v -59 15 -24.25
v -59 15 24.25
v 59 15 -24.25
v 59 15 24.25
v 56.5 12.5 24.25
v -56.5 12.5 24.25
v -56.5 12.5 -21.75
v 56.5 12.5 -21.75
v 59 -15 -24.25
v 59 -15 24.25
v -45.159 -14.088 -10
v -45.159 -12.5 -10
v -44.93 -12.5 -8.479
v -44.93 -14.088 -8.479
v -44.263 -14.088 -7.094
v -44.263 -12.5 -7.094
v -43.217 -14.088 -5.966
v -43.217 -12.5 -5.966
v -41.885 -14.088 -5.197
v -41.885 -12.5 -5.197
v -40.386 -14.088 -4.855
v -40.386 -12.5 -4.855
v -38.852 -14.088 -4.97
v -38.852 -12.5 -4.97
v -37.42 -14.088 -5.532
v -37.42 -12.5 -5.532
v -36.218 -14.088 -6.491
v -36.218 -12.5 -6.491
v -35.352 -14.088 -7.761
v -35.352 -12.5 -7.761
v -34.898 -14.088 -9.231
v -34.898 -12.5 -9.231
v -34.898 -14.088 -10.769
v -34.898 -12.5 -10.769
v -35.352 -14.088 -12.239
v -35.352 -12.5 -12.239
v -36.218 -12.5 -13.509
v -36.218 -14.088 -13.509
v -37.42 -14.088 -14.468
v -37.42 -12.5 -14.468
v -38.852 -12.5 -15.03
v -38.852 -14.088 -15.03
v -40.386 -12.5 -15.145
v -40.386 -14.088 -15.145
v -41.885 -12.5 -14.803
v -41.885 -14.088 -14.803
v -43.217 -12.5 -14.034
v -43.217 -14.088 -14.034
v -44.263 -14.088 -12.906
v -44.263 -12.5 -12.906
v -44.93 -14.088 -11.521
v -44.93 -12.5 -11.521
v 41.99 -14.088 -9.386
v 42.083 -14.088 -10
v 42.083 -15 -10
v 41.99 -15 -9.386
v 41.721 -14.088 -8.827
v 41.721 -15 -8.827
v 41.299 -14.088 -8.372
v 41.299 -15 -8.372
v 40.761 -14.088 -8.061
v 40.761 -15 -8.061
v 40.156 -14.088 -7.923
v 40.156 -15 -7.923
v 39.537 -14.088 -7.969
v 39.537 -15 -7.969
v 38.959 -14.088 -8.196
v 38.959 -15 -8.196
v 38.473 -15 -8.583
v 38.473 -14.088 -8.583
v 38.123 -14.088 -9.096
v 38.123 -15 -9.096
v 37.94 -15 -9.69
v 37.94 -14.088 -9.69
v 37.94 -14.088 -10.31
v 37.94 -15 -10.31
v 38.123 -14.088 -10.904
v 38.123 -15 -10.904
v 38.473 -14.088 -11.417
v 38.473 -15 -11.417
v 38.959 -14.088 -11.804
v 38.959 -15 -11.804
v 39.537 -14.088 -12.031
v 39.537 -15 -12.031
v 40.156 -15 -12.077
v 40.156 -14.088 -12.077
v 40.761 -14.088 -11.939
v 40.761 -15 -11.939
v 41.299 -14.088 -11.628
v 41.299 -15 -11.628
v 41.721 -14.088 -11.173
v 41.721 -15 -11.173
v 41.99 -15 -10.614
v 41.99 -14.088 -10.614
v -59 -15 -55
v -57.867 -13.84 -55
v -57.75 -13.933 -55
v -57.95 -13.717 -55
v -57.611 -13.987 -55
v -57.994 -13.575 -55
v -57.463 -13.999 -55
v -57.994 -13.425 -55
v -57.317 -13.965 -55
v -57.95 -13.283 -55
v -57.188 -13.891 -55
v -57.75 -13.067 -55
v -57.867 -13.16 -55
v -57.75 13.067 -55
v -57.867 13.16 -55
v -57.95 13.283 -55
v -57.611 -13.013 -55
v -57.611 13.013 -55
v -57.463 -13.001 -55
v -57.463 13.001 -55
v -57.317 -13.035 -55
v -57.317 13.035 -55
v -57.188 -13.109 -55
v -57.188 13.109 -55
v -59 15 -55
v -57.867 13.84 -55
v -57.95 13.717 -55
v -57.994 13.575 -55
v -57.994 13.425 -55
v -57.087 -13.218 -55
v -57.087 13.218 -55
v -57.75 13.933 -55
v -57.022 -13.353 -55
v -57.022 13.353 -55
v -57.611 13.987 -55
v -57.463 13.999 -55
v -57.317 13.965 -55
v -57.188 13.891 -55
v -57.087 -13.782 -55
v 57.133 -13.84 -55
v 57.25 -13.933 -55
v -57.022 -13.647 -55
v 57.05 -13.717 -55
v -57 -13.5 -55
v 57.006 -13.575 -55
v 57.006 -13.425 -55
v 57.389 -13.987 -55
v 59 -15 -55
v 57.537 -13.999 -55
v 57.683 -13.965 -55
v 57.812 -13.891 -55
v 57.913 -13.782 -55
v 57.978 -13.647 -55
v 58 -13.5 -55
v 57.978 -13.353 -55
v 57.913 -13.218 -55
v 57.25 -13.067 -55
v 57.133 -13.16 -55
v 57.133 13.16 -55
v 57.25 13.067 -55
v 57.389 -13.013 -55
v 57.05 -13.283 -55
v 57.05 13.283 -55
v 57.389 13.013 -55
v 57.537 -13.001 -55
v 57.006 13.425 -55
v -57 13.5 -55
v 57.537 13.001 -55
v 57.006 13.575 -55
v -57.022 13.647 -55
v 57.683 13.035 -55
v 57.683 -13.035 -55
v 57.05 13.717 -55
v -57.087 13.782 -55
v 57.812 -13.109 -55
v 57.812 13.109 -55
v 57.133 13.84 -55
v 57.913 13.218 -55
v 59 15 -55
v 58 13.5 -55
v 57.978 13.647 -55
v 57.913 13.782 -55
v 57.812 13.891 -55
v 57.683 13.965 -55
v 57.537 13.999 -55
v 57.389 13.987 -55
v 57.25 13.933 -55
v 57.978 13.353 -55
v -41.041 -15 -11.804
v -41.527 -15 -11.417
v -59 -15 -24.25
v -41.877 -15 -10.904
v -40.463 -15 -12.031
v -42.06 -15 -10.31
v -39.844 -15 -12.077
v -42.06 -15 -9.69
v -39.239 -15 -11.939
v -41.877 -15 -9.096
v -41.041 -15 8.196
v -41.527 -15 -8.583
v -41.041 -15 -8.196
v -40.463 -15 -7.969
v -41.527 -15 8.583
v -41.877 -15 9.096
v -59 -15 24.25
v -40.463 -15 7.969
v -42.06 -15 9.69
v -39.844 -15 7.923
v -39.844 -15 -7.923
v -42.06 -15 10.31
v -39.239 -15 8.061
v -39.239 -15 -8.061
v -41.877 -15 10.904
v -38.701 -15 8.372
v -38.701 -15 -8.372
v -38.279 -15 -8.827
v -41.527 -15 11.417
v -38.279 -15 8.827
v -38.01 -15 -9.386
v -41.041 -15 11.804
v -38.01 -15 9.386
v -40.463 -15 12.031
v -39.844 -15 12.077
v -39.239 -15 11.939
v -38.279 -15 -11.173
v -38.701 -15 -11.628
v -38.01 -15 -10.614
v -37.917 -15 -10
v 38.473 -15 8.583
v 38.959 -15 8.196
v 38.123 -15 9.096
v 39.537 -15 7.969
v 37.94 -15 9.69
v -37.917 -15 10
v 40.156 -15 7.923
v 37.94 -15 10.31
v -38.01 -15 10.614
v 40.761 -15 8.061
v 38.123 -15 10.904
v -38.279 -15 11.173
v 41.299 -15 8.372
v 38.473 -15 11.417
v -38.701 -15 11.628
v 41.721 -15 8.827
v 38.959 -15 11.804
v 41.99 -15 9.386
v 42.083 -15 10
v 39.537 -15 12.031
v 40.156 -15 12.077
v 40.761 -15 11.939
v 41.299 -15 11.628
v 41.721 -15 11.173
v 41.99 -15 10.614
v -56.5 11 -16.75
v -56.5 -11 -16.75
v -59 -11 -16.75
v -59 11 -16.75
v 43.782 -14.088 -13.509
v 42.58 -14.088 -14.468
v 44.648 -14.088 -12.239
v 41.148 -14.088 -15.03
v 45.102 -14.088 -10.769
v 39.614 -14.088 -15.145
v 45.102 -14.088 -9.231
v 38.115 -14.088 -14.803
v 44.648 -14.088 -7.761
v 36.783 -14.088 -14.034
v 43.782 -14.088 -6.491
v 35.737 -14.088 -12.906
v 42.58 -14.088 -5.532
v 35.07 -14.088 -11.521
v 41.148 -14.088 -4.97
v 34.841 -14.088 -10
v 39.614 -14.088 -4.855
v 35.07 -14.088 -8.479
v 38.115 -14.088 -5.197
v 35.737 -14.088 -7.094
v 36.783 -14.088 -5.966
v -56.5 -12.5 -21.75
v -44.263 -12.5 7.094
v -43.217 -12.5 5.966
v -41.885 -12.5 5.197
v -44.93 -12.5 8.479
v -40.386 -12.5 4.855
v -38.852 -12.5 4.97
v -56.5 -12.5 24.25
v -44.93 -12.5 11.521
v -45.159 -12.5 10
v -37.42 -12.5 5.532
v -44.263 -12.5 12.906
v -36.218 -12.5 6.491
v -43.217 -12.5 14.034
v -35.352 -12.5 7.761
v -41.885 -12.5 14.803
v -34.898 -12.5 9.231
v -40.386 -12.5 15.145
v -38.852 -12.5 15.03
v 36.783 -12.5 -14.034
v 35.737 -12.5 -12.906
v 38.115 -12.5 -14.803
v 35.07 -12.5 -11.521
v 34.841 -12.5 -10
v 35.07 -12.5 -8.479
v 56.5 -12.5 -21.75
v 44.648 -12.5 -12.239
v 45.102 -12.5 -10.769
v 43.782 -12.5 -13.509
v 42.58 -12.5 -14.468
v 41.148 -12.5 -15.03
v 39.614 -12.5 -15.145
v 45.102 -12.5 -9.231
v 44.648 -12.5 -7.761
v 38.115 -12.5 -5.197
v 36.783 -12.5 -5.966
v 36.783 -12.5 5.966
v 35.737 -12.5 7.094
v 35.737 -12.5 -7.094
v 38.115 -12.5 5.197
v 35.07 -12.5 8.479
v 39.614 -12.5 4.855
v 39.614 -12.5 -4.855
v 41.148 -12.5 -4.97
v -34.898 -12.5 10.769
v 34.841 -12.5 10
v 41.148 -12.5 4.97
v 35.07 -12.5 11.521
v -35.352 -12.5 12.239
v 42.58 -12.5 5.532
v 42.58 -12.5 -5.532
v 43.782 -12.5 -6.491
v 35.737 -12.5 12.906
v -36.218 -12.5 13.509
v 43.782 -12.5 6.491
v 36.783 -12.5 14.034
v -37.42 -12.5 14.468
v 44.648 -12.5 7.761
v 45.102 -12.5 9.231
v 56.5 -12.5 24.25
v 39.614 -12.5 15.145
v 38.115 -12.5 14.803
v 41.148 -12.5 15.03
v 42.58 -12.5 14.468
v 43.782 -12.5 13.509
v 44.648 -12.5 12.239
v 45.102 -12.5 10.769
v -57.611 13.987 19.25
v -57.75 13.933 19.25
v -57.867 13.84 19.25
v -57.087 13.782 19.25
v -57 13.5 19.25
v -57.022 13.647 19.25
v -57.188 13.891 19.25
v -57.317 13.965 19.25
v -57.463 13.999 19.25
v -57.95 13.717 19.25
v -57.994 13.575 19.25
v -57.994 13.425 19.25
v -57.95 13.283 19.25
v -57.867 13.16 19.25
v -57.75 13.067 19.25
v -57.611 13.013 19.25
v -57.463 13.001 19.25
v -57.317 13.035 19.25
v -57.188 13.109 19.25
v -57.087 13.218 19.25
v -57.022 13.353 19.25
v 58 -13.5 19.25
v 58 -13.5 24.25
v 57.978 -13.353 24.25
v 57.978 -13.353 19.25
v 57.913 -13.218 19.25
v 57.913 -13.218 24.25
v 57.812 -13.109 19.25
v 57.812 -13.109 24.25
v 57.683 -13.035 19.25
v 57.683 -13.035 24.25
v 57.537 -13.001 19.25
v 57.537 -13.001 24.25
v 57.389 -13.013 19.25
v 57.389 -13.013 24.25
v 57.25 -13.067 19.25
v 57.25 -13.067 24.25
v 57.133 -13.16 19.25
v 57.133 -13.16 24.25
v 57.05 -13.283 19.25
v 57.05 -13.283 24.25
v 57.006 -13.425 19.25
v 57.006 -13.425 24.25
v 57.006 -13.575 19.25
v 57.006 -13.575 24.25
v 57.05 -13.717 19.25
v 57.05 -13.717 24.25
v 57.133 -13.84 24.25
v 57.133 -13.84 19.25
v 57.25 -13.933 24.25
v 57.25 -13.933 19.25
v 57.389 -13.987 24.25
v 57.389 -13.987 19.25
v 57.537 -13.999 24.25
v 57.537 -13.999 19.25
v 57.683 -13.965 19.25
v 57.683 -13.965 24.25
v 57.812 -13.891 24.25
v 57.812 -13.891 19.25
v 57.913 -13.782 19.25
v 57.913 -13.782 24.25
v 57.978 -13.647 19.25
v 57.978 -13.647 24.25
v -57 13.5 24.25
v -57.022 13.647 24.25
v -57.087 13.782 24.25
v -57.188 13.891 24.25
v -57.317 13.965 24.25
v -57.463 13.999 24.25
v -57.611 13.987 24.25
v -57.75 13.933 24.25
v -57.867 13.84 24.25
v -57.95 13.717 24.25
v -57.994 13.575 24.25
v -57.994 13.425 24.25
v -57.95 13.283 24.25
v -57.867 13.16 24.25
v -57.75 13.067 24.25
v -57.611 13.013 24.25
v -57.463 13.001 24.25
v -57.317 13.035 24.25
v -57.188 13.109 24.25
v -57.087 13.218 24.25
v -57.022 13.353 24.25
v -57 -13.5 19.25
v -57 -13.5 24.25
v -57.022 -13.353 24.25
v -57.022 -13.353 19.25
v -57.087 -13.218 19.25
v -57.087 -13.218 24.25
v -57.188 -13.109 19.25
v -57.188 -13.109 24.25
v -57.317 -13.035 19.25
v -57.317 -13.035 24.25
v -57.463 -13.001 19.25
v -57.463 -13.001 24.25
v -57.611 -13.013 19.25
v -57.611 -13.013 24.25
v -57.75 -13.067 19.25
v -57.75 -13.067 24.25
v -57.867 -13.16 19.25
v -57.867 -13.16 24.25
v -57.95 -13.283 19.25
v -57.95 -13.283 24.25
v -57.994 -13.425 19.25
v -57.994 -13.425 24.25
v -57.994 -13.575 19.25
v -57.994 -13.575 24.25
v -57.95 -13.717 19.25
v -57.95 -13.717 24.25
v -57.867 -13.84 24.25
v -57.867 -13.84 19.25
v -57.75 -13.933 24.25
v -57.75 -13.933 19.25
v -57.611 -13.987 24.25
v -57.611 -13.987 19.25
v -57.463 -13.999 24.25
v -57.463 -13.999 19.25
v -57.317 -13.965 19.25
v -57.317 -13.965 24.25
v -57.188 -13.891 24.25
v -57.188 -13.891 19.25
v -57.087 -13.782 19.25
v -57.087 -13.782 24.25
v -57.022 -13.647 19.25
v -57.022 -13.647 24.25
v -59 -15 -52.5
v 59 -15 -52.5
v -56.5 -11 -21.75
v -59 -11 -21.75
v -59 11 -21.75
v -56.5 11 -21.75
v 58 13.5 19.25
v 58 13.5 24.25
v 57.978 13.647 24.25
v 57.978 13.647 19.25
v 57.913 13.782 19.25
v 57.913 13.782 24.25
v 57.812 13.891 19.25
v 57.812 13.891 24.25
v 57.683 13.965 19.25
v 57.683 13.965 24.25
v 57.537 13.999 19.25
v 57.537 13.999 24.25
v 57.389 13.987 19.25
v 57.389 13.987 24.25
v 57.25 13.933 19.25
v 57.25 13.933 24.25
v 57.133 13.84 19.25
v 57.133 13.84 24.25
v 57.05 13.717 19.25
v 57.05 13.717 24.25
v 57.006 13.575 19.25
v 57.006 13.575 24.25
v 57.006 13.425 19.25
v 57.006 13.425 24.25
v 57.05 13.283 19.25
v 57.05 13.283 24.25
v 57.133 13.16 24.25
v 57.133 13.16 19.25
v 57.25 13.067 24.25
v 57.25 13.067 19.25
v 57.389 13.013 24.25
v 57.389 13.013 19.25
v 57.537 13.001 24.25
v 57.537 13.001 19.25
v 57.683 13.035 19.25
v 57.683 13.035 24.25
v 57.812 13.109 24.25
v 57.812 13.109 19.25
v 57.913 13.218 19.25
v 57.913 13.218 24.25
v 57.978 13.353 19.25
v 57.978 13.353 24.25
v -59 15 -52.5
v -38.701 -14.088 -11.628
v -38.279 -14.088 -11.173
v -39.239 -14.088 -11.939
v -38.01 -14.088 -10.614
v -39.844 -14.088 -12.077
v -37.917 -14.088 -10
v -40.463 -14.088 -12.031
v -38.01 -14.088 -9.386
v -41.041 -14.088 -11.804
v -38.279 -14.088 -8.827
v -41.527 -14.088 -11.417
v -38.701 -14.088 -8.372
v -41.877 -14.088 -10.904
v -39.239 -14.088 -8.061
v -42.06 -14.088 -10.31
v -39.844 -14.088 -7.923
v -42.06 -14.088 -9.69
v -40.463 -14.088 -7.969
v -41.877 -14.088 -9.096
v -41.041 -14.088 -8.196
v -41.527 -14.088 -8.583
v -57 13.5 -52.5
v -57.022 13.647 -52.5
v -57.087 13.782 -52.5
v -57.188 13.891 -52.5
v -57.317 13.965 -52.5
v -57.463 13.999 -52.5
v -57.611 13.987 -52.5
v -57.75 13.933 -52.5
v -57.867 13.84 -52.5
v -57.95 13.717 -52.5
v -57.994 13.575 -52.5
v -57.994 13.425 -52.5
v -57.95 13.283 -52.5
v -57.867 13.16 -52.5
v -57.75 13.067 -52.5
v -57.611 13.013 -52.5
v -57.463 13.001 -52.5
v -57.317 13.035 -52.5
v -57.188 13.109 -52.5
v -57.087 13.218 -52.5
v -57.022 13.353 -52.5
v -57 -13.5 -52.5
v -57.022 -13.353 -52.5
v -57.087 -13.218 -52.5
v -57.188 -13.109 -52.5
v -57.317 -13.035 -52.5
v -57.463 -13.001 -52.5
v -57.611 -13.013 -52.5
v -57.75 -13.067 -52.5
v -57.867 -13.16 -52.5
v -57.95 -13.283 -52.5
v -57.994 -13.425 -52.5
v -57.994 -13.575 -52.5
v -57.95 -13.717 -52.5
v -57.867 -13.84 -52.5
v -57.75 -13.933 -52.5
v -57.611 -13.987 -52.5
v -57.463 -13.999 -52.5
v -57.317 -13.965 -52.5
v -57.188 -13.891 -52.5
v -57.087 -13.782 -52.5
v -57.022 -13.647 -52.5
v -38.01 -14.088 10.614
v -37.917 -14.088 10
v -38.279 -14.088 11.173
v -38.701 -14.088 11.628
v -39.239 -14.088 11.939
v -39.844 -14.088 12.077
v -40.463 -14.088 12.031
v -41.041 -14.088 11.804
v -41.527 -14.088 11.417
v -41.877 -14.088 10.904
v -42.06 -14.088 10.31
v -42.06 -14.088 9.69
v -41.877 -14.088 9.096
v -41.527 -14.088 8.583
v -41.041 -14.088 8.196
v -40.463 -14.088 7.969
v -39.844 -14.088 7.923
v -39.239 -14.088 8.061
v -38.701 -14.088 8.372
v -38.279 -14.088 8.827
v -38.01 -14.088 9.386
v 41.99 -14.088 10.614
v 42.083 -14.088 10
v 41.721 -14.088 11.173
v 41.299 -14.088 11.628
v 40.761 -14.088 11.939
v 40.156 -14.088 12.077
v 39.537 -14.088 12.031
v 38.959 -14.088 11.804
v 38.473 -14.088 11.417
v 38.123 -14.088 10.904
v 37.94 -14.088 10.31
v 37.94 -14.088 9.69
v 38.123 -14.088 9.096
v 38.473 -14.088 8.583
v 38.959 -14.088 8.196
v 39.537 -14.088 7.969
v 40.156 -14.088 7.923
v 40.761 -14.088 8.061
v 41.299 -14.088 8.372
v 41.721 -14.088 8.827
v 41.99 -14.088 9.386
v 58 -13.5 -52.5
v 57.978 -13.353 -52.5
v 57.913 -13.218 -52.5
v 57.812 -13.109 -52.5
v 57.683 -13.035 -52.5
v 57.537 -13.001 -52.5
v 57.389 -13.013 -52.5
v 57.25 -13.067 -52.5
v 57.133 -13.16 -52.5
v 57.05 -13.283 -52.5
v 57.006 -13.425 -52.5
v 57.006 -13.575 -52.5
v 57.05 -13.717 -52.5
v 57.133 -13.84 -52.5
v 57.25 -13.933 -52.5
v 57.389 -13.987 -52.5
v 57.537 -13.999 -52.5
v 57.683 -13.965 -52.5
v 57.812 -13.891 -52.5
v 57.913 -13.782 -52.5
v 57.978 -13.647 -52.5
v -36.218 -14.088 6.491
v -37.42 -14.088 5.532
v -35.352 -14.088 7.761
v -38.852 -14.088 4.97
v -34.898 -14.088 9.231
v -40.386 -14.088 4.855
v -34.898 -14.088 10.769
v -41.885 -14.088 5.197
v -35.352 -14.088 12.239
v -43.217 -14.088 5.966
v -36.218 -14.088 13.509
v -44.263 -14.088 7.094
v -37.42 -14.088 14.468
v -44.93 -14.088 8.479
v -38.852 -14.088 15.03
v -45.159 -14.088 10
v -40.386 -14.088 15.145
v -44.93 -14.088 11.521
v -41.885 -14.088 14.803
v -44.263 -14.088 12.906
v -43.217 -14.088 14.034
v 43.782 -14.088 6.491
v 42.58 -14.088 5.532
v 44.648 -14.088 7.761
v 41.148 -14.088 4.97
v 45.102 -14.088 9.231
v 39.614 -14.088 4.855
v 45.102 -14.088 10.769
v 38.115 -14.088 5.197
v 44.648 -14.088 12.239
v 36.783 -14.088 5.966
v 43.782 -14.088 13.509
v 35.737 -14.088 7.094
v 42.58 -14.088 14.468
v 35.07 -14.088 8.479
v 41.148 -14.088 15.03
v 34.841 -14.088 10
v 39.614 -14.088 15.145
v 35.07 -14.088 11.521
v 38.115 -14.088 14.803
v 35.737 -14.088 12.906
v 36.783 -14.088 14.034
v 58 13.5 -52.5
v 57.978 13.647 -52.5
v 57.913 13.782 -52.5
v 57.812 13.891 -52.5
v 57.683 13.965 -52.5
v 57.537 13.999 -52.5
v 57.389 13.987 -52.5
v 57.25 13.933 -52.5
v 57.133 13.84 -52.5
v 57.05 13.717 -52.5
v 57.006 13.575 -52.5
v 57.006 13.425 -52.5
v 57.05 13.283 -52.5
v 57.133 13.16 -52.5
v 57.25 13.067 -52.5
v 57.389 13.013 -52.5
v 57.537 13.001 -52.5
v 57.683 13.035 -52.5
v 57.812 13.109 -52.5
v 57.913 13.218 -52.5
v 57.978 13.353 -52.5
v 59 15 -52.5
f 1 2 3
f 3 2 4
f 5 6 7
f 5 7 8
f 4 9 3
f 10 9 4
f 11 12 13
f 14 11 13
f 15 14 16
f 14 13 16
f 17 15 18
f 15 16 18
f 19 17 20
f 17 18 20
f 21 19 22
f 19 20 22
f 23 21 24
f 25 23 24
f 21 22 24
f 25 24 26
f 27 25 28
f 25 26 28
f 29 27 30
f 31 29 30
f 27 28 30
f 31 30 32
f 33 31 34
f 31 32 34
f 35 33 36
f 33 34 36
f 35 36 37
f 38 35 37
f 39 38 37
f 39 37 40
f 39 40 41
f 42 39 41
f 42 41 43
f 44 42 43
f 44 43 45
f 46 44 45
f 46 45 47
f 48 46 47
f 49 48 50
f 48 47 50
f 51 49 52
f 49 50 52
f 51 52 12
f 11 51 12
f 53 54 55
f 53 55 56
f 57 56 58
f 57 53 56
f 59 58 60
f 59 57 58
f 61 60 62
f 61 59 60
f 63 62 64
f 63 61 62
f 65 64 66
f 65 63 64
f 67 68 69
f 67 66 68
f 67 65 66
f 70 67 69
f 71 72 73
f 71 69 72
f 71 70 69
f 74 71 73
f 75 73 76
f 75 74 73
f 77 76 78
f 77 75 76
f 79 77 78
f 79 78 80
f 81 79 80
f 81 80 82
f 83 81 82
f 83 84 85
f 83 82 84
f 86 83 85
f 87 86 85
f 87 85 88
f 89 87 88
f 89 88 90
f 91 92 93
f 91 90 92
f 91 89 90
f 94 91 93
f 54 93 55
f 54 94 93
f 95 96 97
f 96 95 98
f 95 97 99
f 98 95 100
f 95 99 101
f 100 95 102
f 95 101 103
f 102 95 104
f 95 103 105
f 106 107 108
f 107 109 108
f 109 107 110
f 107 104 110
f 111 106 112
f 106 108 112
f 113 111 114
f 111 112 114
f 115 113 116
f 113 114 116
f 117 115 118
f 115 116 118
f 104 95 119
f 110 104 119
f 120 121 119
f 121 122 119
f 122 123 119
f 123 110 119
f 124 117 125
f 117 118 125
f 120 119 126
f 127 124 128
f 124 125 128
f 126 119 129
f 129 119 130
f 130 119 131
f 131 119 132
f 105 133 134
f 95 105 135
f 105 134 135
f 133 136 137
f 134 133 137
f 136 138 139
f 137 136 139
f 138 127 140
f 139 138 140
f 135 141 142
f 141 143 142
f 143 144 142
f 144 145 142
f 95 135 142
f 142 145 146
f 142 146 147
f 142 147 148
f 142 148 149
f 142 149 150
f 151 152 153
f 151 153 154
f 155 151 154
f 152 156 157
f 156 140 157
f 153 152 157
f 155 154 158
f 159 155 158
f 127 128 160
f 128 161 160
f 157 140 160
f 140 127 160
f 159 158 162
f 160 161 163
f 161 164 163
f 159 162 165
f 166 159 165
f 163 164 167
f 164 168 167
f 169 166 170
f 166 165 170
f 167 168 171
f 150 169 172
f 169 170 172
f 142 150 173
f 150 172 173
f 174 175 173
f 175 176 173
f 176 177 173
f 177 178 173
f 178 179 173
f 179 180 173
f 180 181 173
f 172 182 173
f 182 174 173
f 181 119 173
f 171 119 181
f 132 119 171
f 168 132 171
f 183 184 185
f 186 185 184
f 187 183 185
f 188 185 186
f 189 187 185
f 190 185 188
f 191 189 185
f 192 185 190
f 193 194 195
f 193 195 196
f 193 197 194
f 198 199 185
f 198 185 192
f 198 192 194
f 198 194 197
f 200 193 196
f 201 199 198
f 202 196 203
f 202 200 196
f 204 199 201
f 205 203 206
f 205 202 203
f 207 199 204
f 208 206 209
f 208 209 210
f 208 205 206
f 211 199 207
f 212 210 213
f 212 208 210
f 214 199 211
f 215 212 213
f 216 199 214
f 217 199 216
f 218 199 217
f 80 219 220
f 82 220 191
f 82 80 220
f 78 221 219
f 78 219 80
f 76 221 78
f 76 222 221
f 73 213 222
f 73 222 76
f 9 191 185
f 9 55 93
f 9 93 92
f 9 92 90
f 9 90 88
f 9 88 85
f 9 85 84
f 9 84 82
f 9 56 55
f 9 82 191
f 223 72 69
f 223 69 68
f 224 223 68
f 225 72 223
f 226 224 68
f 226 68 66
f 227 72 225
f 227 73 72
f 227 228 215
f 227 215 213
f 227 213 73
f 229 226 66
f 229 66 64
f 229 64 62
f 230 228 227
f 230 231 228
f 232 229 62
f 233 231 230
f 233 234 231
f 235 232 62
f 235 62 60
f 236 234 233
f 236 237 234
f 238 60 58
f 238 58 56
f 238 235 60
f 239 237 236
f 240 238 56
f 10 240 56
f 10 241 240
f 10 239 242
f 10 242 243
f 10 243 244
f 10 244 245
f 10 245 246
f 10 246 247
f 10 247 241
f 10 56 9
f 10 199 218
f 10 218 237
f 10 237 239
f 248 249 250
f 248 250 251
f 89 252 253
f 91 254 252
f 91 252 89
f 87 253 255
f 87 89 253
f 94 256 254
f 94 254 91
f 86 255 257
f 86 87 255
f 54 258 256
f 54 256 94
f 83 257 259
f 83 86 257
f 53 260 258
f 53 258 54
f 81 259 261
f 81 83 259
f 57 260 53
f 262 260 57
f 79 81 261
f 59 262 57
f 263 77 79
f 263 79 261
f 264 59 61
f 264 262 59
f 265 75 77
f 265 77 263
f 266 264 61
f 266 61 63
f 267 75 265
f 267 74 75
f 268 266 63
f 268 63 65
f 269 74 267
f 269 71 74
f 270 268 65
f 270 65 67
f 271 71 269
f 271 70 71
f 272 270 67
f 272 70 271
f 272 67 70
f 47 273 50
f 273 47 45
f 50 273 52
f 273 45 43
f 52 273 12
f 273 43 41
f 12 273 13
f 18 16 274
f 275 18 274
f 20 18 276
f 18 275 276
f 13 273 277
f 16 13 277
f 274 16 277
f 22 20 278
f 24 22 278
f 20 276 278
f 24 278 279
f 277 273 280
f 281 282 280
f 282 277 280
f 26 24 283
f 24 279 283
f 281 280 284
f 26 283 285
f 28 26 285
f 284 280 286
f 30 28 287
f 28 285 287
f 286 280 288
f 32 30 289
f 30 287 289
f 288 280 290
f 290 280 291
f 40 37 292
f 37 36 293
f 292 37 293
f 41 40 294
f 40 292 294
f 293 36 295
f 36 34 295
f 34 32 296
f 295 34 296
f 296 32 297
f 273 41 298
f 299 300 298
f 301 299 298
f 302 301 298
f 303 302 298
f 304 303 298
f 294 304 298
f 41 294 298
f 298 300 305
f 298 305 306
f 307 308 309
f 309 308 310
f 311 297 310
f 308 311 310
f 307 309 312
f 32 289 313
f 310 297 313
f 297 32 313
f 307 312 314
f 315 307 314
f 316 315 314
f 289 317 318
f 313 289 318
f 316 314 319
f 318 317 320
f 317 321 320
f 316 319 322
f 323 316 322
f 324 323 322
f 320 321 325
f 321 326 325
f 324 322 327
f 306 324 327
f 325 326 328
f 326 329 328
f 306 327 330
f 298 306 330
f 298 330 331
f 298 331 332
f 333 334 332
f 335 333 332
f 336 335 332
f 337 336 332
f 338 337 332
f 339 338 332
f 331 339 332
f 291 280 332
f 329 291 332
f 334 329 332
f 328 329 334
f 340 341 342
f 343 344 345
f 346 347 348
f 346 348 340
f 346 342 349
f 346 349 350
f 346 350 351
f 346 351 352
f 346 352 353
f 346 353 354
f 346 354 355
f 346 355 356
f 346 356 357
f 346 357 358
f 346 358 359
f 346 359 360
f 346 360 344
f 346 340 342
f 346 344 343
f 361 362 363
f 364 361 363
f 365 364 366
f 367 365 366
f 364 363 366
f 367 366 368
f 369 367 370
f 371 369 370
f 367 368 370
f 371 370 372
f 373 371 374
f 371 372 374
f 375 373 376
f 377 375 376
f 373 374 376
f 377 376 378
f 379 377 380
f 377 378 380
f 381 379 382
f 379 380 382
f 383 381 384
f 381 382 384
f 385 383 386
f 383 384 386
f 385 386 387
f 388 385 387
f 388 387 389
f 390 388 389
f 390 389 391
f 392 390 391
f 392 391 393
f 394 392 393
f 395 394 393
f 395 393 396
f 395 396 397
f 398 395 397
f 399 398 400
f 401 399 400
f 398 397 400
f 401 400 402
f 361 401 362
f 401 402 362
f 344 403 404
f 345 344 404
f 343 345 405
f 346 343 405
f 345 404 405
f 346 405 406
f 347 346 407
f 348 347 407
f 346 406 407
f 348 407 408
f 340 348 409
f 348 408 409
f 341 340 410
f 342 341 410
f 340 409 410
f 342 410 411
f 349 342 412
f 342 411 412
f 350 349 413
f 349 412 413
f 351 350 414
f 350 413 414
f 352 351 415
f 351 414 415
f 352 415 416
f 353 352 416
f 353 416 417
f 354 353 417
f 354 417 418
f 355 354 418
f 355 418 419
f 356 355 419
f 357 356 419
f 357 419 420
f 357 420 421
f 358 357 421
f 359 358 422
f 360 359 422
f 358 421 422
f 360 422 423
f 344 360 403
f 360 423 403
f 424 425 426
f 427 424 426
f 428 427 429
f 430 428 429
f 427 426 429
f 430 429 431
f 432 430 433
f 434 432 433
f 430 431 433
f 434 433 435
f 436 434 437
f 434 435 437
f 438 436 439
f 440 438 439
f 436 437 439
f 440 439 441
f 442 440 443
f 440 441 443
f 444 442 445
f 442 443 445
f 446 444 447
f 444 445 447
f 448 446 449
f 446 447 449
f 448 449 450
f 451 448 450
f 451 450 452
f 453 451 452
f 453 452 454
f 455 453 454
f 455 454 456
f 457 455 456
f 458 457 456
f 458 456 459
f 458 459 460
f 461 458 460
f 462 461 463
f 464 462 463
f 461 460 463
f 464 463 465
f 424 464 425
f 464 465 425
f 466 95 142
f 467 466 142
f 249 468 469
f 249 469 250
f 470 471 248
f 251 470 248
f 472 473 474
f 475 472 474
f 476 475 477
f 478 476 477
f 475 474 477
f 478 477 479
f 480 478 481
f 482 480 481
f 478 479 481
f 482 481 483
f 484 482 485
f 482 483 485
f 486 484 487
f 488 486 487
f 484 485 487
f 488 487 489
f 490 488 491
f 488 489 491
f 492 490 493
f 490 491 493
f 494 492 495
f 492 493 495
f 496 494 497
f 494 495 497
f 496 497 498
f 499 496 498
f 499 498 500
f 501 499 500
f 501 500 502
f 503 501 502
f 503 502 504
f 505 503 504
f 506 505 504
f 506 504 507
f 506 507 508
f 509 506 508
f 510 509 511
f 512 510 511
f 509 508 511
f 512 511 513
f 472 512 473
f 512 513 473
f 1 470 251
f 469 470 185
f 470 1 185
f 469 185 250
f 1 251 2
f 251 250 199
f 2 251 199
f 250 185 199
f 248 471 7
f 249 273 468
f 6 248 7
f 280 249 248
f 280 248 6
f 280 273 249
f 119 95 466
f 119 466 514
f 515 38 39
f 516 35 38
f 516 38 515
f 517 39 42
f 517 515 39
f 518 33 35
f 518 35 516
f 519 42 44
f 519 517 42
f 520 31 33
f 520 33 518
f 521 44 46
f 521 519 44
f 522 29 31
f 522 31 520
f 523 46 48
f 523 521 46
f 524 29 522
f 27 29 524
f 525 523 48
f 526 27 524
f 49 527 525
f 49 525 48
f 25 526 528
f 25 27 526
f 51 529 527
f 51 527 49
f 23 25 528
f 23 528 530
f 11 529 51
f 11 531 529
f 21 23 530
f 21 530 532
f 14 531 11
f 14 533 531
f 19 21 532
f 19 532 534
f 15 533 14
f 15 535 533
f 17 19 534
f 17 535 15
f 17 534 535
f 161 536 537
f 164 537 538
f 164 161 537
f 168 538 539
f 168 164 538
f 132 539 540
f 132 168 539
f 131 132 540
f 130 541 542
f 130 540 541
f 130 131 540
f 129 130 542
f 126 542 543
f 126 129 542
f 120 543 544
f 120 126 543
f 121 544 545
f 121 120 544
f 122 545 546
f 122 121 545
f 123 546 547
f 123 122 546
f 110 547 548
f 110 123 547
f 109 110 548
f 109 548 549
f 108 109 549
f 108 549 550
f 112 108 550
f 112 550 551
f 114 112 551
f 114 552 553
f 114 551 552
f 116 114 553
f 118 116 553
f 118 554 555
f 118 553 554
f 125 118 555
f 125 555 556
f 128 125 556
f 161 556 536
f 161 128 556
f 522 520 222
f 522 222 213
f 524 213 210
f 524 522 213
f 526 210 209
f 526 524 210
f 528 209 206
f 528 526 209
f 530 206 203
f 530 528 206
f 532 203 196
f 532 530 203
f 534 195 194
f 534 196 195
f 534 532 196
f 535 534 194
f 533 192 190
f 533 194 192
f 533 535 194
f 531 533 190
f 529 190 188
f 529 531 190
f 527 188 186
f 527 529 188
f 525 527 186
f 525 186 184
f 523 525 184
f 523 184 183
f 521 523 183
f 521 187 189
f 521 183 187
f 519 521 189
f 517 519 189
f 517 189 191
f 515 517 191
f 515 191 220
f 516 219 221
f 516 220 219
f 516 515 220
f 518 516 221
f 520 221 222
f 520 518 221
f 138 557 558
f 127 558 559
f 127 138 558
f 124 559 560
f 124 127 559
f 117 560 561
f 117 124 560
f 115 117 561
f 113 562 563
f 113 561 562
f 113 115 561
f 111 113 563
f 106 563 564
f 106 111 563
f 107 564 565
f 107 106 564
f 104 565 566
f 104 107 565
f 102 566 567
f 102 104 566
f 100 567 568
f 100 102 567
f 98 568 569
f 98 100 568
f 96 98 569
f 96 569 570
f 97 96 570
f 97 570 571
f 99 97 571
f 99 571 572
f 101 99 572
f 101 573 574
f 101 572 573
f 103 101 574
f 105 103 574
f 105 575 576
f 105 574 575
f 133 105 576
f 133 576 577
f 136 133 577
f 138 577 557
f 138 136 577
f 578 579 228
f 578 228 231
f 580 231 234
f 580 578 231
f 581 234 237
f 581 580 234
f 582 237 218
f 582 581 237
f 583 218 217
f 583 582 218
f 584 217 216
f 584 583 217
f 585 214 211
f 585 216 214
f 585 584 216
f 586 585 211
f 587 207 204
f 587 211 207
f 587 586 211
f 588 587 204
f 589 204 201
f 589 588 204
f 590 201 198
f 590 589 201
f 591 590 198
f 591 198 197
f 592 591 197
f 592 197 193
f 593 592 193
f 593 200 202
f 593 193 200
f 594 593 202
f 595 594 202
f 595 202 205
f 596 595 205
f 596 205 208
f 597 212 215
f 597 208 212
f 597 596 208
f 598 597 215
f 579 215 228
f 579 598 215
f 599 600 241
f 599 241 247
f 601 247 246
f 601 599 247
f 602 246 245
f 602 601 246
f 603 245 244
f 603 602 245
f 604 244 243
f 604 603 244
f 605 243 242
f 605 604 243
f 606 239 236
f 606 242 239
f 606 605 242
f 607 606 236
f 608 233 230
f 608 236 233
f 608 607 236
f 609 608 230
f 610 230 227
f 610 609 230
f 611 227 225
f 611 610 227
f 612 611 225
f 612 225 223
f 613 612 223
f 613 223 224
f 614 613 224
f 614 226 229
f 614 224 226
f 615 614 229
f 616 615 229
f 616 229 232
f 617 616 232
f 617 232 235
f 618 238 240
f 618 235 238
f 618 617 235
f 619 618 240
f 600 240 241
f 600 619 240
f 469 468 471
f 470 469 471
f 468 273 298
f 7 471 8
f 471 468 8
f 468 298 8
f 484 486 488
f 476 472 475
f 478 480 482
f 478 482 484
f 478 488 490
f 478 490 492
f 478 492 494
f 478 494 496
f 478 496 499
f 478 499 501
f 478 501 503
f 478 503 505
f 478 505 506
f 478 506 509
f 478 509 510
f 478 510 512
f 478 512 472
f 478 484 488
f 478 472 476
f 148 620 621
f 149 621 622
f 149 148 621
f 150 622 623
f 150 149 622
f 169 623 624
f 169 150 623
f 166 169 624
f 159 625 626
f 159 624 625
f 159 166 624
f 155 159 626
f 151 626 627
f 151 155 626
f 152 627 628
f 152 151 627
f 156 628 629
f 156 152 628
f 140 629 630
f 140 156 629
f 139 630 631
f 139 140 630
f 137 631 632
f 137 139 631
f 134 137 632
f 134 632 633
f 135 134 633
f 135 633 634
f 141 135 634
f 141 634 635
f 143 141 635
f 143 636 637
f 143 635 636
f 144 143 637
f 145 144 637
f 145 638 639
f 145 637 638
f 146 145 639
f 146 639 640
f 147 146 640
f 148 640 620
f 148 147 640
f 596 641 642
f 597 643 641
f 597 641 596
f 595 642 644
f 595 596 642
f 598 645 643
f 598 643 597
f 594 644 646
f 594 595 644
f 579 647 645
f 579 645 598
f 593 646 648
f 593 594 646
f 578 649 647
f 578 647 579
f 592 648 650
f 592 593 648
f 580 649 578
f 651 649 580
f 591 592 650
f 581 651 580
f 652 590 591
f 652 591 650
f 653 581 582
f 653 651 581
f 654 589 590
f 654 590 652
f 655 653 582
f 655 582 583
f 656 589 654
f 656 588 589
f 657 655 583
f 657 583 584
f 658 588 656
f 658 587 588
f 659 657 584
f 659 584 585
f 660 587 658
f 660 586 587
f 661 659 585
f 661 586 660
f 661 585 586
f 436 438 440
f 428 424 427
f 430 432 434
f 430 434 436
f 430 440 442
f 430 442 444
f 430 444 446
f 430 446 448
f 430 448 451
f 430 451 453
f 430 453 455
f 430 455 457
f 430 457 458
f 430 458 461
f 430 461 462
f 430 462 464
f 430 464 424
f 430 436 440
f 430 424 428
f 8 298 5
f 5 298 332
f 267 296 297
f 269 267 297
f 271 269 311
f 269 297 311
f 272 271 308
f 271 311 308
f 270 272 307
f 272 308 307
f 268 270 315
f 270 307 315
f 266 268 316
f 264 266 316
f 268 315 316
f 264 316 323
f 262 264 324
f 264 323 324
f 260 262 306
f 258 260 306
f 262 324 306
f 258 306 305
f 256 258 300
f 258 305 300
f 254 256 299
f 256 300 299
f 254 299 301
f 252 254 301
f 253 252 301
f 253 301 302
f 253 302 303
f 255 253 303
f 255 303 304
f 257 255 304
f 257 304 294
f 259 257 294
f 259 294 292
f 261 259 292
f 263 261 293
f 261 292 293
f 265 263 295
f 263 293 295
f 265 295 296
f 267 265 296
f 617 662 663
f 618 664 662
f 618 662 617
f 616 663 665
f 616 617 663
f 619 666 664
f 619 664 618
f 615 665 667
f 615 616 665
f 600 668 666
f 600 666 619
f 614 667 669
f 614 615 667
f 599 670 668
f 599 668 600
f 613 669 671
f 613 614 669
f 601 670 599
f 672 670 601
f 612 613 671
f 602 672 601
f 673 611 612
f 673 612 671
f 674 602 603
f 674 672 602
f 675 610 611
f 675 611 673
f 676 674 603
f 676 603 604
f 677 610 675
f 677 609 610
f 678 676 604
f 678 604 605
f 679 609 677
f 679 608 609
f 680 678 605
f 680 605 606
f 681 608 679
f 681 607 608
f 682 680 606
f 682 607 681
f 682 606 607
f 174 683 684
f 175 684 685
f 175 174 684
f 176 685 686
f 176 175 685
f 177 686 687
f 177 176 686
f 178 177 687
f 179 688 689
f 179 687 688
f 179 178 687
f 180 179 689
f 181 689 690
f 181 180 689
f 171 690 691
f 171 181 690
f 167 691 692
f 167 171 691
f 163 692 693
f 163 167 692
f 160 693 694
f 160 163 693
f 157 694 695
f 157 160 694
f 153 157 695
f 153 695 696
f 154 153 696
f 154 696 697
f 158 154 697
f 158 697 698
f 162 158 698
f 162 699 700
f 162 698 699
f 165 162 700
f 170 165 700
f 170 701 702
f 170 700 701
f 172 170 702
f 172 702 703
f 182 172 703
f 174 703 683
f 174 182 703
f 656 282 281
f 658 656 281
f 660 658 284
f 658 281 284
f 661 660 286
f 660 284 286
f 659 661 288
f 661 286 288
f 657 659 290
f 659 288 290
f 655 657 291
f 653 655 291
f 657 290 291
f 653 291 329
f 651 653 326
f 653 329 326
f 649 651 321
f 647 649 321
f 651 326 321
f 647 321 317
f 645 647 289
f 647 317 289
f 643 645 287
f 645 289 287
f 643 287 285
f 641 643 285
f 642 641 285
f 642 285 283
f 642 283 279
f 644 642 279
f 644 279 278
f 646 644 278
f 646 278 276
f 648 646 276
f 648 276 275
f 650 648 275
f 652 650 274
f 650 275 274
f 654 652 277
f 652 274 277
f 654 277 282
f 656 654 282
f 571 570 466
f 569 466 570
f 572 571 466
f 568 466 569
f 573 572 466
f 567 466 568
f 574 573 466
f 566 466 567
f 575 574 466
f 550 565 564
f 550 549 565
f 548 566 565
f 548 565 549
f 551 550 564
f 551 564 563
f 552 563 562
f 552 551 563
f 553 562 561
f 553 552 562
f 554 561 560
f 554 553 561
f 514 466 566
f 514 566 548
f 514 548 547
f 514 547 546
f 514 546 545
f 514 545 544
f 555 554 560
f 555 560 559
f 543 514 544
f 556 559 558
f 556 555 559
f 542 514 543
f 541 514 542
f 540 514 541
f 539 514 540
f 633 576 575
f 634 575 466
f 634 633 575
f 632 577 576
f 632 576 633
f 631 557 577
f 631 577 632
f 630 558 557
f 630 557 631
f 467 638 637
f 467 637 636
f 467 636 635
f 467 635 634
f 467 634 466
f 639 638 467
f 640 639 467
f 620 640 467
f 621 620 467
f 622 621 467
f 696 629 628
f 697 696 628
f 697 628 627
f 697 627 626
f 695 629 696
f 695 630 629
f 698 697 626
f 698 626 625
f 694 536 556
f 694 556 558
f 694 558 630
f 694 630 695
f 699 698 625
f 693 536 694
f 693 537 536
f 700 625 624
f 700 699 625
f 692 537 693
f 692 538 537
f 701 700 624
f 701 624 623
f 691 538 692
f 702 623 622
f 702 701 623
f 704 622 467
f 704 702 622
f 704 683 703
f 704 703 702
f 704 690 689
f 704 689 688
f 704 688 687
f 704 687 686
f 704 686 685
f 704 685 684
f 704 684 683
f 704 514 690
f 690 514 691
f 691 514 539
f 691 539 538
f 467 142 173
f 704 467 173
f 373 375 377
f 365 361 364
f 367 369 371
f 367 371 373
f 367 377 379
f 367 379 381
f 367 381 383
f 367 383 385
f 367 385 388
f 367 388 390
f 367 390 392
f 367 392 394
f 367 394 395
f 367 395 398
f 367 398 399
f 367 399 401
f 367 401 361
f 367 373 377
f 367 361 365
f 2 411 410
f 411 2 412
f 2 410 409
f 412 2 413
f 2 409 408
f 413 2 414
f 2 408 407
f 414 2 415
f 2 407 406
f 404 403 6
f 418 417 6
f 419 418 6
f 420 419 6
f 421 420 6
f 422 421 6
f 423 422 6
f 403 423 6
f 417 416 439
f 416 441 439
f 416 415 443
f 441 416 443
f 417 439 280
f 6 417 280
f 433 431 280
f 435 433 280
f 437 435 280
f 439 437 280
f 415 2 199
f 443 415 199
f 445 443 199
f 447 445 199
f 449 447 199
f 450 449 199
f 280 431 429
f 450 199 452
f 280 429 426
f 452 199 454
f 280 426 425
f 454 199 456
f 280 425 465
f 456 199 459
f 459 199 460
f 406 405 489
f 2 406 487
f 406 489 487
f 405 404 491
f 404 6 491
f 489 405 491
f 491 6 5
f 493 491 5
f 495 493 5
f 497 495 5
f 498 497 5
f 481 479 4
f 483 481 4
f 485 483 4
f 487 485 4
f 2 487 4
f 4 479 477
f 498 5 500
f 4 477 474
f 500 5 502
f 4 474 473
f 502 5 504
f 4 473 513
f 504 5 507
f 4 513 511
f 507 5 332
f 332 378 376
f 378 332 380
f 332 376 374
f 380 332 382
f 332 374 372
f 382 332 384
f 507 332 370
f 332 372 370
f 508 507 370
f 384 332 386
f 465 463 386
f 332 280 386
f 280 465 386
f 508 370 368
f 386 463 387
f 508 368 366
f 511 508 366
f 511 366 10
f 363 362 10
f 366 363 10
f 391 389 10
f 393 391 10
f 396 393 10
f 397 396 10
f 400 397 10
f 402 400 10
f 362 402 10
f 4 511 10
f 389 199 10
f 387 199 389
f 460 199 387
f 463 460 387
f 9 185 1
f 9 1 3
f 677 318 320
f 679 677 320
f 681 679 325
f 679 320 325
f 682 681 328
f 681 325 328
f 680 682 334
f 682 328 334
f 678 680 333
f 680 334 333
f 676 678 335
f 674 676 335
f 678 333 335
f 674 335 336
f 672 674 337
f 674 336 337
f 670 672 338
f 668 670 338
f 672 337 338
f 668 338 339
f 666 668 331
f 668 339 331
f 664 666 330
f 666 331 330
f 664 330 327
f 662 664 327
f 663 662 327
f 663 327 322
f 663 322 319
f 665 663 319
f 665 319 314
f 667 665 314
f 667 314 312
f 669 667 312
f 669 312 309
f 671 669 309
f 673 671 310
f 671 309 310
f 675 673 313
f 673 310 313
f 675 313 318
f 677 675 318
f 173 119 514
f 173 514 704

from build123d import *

# Parameters (mm, degrees)
F0_W      = 118
F0_H      = 48.5
F1_DEPTH  = 15
F2_T      = -2.5
F3_W      = 22
F3_H      = 5
F4_DEPTH  = 59.4
F5_R      = 2.0828
F6_DEPTH  = 25
F8_W      = 118
F8_H      = 30
F9_DEPTH  = 2.5
F10_R     = 0.5
F11_DEPTH = 55
F12_R     = 0.5
F13_DEPTH = 5
F14_R     = 5.159375
F15_DEPTH = 1.5875


# Not quite as in the source:
# - a length typed as a fraction of an inch, garbled in the dataset ("3 / 203.2 mm" for 3/8 in), is restored


with BuildPart() as f1:
    # F0 (on Front) → F1 (new body, symmetric)
    with BuildSketch(Plane.XZ):
        Rectangle(F0_W, F0_H)
    extrude(amount=F1_DEPTH, both=True)

    # F2
    f2_openings = [f1.faces().sort_by_distance(p)[0] for p in [
        (0, 0, 24.25),
    ]]
    offset(amount=F2_T, openings=f2_openings)

    # F3 (on Right) → F4 (cut)
    with BuildSketch(Plane.YZ):
        with Locations((0, -19.25)):
            Rectangle(F3_W, F3_H)
    extrude(amount=-F4_DEPTH, mode=Mode.SUBTRACT)

    # F5 (on Front) → F6 (cut)
    with BuildSketch(Plane.XZ):
        with Locations((40, -10)):
            Circle(F5_R)
        with Locations((-40, -10)):
            Circle(F5_R)
        with Locations((-40, 10)):
            Circle(F5_R)
        with Locations((40, 10)):
            Circle(F5_R)
    extrude(amount=F6_DEPTH, mode=Mode.SUBTRACT)

    # F12 (on face) → F13 (cut)
    with BuildSketch(Plane.XY.offset(24.25)):
        with Locations((-57.5, 13.5)):
            Circle(F12_R)
        with Locations((-57.5, -13.5)):
            Circle(F12_R)
        with Locations((57.5, -13.5)):
            Circle(F12_R)
        with Locations((57.5, 13.5)):
            Circle(F12_R)
    extrude(amount=-F13_DEPTH, mode=Mode.SUBTRACT)

    # F14 (on face) → F15 (cut)
    with BuildSketch(Plane(origin=(0, -12.5, 0), x_dir=(-1, 0, 0), z_dir=(0, 1, 0))):
        with Locations((40, -10)):
            Circle(F14_R)
        with Locations((40, 10)):
            Circle(F14_R)
        with Locations((-40, 10)):
            Circle(F14_R)
        with Locations((-40, -10)):
            Circle(F14_R)
    extrude(amount=-F15_DEPTH, mode=Mode.SUBTRACT)


with BuildPart() as f9:
    # F8 (on offset) → F9 (new body)
    with BuildSketch(Plane.XY.offset(-55)):
        Rectangle(F8_W, F8_H)
    extrude(amount=F9_DEPTH)

    # F10 (on offset) → F11 (cut)
    with BuildSketch(Plane.XY.offset(-55)):
        with Locations((-57.5, 13.5)):
            Circle(F10_R)
        with Locations((-57.5, -13.5)):
            Circle(F10_R)
        with Locations((57.5, -13.5)):
            Circle(F10_R)
        with Locations((57.5, 13.5)):
            Circle(F10_R)
    extrude(amount=F11_DEPTH, mode=Mode.SUBTRACT)


solid = Compound([f1.part, f9.part])
